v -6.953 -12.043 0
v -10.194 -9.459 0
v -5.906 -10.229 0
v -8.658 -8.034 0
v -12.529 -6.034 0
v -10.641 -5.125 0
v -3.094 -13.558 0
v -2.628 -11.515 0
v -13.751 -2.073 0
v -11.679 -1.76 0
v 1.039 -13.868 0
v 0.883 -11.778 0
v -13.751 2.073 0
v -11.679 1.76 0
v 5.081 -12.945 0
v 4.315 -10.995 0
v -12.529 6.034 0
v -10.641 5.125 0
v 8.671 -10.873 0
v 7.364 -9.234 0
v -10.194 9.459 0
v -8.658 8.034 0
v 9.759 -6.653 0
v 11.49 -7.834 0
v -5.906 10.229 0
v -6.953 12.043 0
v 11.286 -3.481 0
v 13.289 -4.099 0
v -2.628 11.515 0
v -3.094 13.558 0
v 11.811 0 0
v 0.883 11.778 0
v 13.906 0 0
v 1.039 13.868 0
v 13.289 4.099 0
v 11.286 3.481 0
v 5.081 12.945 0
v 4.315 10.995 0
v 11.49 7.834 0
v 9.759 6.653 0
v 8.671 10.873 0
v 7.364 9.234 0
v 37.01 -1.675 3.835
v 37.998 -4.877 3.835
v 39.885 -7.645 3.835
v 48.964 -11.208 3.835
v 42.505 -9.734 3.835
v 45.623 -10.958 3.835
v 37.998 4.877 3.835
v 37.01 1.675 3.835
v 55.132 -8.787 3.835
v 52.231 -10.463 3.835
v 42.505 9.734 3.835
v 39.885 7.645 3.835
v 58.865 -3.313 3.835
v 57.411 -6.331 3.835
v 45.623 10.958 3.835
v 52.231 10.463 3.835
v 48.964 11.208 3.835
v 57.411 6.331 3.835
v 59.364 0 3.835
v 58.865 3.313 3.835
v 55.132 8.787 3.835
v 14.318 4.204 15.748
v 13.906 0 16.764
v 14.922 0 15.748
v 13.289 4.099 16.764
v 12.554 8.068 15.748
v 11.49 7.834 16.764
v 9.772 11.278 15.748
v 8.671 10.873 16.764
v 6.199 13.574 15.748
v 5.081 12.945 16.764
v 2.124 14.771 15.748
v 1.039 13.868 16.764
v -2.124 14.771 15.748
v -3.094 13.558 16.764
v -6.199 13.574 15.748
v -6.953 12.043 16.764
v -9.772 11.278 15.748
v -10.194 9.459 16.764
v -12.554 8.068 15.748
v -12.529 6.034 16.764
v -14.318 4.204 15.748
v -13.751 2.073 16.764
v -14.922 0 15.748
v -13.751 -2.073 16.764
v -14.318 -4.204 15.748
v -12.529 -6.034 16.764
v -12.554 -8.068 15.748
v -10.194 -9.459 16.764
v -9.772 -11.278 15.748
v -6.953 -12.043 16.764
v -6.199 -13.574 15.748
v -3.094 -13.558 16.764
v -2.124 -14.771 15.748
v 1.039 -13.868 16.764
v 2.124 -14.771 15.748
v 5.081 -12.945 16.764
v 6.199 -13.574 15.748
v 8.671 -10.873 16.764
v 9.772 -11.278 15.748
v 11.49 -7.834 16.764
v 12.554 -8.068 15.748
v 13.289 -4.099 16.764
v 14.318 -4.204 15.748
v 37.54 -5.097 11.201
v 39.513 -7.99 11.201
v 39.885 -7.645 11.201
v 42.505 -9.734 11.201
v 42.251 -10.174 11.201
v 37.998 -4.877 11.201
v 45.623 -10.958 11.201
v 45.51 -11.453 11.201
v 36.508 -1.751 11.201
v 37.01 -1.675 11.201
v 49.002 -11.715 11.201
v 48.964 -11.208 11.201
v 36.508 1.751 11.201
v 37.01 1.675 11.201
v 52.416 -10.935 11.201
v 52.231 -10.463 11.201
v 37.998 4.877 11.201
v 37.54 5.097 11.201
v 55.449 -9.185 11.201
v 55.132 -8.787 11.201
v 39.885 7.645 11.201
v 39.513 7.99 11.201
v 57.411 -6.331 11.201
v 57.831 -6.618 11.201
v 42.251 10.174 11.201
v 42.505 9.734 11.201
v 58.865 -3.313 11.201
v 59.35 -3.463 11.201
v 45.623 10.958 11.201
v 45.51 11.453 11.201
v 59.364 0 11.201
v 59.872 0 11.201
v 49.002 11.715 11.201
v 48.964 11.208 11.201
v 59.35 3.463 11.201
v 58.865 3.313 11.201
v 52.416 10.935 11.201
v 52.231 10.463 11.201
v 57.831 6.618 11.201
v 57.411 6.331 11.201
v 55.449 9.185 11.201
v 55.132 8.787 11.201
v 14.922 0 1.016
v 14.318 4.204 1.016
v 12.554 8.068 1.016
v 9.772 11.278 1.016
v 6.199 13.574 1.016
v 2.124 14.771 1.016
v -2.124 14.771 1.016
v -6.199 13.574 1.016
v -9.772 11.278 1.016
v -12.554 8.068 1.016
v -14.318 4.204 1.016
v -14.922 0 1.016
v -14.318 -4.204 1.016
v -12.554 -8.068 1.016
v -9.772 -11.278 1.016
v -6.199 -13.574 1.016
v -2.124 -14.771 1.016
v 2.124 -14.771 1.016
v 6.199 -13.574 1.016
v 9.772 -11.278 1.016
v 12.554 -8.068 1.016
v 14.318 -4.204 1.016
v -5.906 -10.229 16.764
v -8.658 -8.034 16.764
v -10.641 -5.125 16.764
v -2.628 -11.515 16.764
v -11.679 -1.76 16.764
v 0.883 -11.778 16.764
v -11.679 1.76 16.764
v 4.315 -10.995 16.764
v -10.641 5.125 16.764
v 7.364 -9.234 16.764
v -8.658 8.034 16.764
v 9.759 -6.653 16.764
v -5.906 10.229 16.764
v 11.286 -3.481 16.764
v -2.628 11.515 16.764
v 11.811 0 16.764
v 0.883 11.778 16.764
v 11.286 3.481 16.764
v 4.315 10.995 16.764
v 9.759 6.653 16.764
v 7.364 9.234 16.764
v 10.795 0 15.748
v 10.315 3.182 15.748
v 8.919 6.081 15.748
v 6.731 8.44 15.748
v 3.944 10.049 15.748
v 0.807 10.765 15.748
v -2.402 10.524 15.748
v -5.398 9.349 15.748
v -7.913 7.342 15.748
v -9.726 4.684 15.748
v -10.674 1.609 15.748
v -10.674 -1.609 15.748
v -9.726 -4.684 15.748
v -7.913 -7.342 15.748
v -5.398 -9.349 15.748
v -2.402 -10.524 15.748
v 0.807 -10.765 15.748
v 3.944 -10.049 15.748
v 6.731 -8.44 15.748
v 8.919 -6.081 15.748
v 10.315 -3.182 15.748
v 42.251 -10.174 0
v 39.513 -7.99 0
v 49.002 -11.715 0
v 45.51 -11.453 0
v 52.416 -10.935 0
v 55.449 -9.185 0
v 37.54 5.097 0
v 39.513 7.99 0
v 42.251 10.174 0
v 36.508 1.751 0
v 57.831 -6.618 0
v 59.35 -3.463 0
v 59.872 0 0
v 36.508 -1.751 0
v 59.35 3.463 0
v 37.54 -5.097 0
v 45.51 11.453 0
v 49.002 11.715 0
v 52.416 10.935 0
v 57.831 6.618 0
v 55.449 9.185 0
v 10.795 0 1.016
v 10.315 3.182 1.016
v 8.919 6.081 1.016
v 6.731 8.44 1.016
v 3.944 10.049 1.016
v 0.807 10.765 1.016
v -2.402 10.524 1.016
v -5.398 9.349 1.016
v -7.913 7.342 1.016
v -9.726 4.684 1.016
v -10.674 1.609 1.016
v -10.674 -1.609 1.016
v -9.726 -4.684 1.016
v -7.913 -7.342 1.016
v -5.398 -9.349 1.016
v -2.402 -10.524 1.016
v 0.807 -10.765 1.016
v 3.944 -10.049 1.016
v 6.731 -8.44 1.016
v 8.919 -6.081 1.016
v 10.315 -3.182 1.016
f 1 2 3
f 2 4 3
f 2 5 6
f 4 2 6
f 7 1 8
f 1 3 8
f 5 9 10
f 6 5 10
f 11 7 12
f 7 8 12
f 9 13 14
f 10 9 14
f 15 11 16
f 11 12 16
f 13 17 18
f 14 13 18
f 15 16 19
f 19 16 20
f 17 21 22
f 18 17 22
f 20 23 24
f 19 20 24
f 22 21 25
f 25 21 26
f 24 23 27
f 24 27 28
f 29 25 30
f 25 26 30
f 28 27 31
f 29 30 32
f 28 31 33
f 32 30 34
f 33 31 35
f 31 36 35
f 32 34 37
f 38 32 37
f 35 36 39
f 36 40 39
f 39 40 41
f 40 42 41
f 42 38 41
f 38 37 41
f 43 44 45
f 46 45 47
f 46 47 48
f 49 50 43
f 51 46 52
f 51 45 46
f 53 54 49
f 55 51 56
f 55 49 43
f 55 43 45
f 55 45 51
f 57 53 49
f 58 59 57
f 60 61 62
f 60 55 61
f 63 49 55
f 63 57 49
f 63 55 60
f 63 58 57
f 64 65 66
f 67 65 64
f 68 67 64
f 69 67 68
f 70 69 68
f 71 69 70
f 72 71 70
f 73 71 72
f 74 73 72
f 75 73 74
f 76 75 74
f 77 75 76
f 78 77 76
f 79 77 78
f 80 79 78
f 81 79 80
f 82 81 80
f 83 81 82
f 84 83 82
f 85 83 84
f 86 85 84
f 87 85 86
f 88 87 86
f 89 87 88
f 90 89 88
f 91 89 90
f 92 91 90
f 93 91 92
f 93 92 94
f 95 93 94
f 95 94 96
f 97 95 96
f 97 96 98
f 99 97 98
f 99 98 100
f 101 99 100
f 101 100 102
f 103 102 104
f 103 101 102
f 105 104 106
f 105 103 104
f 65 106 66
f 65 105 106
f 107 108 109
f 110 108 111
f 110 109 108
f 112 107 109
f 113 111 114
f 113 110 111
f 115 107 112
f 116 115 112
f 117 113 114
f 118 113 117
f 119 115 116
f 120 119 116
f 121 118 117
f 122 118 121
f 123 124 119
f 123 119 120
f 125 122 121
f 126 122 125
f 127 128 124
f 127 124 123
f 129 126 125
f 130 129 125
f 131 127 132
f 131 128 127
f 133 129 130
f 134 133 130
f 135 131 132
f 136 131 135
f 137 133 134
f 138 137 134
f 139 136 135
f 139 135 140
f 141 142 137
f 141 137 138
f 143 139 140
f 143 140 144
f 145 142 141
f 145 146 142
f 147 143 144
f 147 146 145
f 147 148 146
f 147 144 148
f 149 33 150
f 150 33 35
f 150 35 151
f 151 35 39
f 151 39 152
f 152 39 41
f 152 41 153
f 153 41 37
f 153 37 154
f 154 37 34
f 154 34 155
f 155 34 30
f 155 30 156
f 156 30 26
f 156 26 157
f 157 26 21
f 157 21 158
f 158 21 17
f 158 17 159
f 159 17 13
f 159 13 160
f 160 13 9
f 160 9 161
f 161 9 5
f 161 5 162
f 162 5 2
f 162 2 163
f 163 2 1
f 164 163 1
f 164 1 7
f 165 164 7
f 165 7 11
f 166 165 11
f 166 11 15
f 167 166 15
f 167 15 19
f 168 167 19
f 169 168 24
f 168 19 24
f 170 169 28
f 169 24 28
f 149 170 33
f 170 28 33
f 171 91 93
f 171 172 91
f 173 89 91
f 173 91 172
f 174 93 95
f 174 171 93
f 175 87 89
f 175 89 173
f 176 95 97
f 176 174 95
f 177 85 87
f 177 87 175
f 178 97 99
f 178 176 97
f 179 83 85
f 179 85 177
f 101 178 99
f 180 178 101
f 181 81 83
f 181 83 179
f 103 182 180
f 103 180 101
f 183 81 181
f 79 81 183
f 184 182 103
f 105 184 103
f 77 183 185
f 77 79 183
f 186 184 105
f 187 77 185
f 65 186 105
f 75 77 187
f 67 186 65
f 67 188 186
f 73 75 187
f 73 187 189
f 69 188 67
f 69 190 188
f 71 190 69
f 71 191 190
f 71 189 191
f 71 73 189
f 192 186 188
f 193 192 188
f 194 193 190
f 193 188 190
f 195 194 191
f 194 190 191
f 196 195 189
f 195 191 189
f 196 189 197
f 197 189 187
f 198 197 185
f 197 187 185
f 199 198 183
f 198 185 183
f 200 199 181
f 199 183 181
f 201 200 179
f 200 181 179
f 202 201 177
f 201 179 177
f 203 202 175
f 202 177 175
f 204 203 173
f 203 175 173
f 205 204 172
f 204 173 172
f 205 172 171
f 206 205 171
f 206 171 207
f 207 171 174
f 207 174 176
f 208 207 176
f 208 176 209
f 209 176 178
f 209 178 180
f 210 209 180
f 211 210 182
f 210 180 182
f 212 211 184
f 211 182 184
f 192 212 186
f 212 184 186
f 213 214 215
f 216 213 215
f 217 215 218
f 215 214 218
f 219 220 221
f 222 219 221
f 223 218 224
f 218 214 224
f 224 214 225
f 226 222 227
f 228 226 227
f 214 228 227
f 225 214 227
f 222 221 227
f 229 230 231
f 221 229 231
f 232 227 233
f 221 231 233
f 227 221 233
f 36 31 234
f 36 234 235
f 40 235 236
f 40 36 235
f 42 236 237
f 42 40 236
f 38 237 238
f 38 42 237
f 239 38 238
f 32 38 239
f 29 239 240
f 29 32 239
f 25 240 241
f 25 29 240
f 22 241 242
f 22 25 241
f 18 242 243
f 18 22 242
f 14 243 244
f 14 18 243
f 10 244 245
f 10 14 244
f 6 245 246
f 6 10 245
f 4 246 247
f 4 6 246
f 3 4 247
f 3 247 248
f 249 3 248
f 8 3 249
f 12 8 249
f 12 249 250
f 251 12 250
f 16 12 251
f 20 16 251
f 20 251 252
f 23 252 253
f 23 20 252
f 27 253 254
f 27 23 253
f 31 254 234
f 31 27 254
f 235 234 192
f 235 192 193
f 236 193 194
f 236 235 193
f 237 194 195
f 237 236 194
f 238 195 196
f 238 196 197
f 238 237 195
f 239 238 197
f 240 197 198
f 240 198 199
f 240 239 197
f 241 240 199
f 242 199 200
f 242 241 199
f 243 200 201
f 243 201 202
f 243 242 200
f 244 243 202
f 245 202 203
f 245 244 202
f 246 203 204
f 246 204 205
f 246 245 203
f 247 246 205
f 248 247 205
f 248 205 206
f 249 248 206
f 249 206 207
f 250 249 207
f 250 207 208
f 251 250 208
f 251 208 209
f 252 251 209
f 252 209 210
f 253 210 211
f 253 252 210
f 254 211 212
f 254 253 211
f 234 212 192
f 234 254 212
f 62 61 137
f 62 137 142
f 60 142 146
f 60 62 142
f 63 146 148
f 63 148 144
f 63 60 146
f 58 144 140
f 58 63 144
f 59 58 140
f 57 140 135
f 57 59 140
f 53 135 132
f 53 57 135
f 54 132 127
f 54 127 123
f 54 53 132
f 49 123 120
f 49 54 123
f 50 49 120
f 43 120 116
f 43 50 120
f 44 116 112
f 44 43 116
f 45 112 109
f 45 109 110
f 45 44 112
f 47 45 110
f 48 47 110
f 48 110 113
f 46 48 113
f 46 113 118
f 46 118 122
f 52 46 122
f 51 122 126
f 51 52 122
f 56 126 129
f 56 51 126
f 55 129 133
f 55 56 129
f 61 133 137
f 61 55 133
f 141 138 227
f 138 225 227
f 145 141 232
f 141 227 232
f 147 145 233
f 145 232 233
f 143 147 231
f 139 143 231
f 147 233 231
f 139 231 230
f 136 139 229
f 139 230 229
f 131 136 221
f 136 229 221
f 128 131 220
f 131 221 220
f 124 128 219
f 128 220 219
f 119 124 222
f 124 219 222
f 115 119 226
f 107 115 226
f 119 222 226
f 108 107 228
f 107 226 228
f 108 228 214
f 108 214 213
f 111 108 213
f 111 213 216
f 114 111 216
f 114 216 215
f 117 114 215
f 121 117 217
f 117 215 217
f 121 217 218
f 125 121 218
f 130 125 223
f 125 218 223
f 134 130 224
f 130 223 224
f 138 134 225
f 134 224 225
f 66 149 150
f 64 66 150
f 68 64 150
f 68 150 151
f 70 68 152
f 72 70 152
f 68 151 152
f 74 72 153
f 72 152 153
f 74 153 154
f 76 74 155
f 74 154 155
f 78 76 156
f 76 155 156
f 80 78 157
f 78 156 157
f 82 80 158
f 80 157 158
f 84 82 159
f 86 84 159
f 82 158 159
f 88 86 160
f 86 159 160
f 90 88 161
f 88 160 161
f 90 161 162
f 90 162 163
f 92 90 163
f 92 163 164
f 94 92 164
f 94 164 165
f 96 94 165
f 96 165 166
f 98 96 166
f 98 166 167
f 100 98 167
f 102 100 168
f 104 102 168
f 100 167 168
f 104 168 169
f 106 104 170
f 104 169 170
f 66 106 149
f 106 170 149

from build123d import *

# Parameters (mm, degrees)
F0_R     = 14.9225
F0_R_2   = 10.795
F1_DEPTH = 16.764
F2_SIZE  = 1.016
F3_R     = 11.7475
F4_DEPTH = 3.8354
F5_R     = 11.7475
F5_R_2   = 11.2395
F6_DEPTH = 7.366


with BuildPart() as f1:
    # F0 (on Top) → F1 (new body)
    with BuildSketch(Plane.XY):
        Circle(F0_R)
        Circle(F0_R_2, mode=Mode.SUBTRACT)
    extrude(amount=F1_DEPTH)

    # F2
    f2_edges = [f1.edges().sort_by_distance(p)[0] for p in [
        (-10.795, 0, 16.764),
        (-14.9225, 0, 16.764),
        (-10.795, 0, 0),
        (-14.9225, 0, 0),
    ]]
    chamfer(f2_edges, length=F2_SIZE)


with BuildPart() as f4:
    # F3 (on Top) → F4 (new body)
    with BuildSketch(Plane.XY):
        with Locations((48.124437, 0)):
            Circle(F3_R)
    extrude(amount=F4_DEPTH)

    # F5 (on face) → F6 (join)
    with BuildSketch(Plane.XY.offset(3.8354)):
        with Locations((48.124437, 0)):
            Circle(F5_R)
        with Locations((48.124437, 0)):
            Circle(F5_R_2, mode=Mode.SUBTRACT)
    extrude(amount=F6_DEPTH)


solid = Compound([f1.part, f4.part])
